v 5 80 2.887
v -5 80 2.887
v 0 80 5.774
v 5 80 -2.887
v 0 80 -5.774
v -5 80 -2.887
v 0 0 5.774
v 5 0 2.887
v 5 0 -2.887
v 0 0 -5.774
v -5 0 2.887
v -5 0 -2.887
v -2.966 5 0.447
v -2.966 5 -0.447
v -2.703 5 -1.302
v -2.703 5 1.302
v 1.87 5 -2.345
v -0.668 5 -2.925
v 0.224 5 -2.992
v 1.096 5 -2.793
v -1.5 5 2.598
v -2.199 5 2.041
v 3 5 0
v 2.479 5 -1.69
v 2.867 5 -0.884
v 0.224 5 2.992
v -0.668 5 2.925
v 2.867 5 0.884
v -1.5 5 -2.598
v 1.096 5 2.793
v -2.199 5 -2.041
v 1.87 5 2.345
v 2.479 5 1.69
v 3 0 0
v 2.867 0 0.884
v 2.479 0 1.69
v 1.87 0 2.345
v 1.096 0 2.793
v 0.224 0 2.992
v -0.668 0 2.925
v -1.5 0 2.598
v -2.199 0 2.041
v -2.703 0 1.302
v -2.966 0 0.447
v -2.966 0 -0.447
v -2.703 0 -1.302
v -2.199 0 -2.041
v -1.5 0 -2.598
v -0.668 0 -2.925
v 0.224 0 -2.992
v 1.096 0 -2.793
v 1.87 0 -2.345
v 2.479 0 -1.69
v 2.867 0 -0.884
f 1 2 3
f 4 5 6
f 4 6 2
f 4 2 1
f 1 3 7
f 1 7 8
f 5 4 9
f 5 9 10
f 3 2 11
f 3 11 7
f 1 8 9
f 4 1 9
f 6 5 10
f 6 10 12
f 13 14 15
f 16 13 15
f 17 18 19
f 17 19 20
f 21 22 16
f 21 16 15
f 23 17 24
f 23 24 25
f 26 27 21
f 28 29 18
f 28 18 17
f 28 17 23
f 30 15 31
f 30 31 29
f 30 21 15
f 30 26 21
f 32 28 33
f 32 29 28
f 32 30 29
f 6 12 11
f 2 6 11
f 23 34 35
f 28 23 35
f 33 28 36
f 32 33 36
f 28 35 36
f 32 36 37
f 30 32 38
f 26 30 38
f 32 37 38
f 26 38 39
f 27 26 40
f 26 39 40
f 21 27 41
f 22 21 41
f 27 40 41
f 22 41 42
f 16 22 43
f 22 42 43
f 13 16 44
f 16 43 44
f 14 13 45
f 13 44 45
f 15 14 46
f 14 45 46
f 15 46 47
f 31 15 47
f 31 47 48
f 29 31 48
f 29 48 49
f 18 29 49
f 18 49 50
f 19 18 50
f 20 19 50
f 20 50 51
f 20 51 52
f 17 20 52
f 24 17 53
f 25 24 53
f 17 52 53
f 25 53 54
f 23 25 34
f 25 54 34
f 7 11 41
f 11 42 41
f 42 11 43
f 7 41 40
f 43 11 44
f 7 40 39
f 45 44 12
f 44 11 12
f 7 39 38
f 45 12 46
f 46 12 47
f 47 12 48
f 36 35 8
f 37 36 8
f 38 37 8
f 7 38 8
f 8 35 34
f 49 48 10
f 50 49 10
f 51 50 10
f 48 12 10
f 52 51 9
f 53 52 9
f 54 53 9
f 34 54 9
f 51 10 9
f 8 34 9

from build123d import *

# Parameters (mm, degrees)
BOSS_EXTRUDE1_DEPTH = 80
SKETCH2_R           = 3
CUT_EXTRUDE1_DEPTH  = 5


with BuildPart() as part:
    # Sketch1 → Boss-Extrude1 (new body)
    with BuildSketch(Plane(origin=(0, 0, 0), x_dir=(1, 0, 0), z_dir=(0, 1, 0))):
        Polygon((0, 5.773502692), (-5, 2.886751346), (-5, -2.886751346), (0, -5.773502692), (5, -2.886751346), (5, 2.886751346), align=None)
    extrude(amount=BOSS_EXTRUDE1_DEPTH)

    # Sketch2 → Cut-Extrude1 (cut)
    with BuildSketch(Plane.XZ):
        Circle(SKETCH2_R)
    extrude(amount=-CUT_EXTRUDE1_DEPTH, mode=Mode.SUBTRACT)


solid = part.part
